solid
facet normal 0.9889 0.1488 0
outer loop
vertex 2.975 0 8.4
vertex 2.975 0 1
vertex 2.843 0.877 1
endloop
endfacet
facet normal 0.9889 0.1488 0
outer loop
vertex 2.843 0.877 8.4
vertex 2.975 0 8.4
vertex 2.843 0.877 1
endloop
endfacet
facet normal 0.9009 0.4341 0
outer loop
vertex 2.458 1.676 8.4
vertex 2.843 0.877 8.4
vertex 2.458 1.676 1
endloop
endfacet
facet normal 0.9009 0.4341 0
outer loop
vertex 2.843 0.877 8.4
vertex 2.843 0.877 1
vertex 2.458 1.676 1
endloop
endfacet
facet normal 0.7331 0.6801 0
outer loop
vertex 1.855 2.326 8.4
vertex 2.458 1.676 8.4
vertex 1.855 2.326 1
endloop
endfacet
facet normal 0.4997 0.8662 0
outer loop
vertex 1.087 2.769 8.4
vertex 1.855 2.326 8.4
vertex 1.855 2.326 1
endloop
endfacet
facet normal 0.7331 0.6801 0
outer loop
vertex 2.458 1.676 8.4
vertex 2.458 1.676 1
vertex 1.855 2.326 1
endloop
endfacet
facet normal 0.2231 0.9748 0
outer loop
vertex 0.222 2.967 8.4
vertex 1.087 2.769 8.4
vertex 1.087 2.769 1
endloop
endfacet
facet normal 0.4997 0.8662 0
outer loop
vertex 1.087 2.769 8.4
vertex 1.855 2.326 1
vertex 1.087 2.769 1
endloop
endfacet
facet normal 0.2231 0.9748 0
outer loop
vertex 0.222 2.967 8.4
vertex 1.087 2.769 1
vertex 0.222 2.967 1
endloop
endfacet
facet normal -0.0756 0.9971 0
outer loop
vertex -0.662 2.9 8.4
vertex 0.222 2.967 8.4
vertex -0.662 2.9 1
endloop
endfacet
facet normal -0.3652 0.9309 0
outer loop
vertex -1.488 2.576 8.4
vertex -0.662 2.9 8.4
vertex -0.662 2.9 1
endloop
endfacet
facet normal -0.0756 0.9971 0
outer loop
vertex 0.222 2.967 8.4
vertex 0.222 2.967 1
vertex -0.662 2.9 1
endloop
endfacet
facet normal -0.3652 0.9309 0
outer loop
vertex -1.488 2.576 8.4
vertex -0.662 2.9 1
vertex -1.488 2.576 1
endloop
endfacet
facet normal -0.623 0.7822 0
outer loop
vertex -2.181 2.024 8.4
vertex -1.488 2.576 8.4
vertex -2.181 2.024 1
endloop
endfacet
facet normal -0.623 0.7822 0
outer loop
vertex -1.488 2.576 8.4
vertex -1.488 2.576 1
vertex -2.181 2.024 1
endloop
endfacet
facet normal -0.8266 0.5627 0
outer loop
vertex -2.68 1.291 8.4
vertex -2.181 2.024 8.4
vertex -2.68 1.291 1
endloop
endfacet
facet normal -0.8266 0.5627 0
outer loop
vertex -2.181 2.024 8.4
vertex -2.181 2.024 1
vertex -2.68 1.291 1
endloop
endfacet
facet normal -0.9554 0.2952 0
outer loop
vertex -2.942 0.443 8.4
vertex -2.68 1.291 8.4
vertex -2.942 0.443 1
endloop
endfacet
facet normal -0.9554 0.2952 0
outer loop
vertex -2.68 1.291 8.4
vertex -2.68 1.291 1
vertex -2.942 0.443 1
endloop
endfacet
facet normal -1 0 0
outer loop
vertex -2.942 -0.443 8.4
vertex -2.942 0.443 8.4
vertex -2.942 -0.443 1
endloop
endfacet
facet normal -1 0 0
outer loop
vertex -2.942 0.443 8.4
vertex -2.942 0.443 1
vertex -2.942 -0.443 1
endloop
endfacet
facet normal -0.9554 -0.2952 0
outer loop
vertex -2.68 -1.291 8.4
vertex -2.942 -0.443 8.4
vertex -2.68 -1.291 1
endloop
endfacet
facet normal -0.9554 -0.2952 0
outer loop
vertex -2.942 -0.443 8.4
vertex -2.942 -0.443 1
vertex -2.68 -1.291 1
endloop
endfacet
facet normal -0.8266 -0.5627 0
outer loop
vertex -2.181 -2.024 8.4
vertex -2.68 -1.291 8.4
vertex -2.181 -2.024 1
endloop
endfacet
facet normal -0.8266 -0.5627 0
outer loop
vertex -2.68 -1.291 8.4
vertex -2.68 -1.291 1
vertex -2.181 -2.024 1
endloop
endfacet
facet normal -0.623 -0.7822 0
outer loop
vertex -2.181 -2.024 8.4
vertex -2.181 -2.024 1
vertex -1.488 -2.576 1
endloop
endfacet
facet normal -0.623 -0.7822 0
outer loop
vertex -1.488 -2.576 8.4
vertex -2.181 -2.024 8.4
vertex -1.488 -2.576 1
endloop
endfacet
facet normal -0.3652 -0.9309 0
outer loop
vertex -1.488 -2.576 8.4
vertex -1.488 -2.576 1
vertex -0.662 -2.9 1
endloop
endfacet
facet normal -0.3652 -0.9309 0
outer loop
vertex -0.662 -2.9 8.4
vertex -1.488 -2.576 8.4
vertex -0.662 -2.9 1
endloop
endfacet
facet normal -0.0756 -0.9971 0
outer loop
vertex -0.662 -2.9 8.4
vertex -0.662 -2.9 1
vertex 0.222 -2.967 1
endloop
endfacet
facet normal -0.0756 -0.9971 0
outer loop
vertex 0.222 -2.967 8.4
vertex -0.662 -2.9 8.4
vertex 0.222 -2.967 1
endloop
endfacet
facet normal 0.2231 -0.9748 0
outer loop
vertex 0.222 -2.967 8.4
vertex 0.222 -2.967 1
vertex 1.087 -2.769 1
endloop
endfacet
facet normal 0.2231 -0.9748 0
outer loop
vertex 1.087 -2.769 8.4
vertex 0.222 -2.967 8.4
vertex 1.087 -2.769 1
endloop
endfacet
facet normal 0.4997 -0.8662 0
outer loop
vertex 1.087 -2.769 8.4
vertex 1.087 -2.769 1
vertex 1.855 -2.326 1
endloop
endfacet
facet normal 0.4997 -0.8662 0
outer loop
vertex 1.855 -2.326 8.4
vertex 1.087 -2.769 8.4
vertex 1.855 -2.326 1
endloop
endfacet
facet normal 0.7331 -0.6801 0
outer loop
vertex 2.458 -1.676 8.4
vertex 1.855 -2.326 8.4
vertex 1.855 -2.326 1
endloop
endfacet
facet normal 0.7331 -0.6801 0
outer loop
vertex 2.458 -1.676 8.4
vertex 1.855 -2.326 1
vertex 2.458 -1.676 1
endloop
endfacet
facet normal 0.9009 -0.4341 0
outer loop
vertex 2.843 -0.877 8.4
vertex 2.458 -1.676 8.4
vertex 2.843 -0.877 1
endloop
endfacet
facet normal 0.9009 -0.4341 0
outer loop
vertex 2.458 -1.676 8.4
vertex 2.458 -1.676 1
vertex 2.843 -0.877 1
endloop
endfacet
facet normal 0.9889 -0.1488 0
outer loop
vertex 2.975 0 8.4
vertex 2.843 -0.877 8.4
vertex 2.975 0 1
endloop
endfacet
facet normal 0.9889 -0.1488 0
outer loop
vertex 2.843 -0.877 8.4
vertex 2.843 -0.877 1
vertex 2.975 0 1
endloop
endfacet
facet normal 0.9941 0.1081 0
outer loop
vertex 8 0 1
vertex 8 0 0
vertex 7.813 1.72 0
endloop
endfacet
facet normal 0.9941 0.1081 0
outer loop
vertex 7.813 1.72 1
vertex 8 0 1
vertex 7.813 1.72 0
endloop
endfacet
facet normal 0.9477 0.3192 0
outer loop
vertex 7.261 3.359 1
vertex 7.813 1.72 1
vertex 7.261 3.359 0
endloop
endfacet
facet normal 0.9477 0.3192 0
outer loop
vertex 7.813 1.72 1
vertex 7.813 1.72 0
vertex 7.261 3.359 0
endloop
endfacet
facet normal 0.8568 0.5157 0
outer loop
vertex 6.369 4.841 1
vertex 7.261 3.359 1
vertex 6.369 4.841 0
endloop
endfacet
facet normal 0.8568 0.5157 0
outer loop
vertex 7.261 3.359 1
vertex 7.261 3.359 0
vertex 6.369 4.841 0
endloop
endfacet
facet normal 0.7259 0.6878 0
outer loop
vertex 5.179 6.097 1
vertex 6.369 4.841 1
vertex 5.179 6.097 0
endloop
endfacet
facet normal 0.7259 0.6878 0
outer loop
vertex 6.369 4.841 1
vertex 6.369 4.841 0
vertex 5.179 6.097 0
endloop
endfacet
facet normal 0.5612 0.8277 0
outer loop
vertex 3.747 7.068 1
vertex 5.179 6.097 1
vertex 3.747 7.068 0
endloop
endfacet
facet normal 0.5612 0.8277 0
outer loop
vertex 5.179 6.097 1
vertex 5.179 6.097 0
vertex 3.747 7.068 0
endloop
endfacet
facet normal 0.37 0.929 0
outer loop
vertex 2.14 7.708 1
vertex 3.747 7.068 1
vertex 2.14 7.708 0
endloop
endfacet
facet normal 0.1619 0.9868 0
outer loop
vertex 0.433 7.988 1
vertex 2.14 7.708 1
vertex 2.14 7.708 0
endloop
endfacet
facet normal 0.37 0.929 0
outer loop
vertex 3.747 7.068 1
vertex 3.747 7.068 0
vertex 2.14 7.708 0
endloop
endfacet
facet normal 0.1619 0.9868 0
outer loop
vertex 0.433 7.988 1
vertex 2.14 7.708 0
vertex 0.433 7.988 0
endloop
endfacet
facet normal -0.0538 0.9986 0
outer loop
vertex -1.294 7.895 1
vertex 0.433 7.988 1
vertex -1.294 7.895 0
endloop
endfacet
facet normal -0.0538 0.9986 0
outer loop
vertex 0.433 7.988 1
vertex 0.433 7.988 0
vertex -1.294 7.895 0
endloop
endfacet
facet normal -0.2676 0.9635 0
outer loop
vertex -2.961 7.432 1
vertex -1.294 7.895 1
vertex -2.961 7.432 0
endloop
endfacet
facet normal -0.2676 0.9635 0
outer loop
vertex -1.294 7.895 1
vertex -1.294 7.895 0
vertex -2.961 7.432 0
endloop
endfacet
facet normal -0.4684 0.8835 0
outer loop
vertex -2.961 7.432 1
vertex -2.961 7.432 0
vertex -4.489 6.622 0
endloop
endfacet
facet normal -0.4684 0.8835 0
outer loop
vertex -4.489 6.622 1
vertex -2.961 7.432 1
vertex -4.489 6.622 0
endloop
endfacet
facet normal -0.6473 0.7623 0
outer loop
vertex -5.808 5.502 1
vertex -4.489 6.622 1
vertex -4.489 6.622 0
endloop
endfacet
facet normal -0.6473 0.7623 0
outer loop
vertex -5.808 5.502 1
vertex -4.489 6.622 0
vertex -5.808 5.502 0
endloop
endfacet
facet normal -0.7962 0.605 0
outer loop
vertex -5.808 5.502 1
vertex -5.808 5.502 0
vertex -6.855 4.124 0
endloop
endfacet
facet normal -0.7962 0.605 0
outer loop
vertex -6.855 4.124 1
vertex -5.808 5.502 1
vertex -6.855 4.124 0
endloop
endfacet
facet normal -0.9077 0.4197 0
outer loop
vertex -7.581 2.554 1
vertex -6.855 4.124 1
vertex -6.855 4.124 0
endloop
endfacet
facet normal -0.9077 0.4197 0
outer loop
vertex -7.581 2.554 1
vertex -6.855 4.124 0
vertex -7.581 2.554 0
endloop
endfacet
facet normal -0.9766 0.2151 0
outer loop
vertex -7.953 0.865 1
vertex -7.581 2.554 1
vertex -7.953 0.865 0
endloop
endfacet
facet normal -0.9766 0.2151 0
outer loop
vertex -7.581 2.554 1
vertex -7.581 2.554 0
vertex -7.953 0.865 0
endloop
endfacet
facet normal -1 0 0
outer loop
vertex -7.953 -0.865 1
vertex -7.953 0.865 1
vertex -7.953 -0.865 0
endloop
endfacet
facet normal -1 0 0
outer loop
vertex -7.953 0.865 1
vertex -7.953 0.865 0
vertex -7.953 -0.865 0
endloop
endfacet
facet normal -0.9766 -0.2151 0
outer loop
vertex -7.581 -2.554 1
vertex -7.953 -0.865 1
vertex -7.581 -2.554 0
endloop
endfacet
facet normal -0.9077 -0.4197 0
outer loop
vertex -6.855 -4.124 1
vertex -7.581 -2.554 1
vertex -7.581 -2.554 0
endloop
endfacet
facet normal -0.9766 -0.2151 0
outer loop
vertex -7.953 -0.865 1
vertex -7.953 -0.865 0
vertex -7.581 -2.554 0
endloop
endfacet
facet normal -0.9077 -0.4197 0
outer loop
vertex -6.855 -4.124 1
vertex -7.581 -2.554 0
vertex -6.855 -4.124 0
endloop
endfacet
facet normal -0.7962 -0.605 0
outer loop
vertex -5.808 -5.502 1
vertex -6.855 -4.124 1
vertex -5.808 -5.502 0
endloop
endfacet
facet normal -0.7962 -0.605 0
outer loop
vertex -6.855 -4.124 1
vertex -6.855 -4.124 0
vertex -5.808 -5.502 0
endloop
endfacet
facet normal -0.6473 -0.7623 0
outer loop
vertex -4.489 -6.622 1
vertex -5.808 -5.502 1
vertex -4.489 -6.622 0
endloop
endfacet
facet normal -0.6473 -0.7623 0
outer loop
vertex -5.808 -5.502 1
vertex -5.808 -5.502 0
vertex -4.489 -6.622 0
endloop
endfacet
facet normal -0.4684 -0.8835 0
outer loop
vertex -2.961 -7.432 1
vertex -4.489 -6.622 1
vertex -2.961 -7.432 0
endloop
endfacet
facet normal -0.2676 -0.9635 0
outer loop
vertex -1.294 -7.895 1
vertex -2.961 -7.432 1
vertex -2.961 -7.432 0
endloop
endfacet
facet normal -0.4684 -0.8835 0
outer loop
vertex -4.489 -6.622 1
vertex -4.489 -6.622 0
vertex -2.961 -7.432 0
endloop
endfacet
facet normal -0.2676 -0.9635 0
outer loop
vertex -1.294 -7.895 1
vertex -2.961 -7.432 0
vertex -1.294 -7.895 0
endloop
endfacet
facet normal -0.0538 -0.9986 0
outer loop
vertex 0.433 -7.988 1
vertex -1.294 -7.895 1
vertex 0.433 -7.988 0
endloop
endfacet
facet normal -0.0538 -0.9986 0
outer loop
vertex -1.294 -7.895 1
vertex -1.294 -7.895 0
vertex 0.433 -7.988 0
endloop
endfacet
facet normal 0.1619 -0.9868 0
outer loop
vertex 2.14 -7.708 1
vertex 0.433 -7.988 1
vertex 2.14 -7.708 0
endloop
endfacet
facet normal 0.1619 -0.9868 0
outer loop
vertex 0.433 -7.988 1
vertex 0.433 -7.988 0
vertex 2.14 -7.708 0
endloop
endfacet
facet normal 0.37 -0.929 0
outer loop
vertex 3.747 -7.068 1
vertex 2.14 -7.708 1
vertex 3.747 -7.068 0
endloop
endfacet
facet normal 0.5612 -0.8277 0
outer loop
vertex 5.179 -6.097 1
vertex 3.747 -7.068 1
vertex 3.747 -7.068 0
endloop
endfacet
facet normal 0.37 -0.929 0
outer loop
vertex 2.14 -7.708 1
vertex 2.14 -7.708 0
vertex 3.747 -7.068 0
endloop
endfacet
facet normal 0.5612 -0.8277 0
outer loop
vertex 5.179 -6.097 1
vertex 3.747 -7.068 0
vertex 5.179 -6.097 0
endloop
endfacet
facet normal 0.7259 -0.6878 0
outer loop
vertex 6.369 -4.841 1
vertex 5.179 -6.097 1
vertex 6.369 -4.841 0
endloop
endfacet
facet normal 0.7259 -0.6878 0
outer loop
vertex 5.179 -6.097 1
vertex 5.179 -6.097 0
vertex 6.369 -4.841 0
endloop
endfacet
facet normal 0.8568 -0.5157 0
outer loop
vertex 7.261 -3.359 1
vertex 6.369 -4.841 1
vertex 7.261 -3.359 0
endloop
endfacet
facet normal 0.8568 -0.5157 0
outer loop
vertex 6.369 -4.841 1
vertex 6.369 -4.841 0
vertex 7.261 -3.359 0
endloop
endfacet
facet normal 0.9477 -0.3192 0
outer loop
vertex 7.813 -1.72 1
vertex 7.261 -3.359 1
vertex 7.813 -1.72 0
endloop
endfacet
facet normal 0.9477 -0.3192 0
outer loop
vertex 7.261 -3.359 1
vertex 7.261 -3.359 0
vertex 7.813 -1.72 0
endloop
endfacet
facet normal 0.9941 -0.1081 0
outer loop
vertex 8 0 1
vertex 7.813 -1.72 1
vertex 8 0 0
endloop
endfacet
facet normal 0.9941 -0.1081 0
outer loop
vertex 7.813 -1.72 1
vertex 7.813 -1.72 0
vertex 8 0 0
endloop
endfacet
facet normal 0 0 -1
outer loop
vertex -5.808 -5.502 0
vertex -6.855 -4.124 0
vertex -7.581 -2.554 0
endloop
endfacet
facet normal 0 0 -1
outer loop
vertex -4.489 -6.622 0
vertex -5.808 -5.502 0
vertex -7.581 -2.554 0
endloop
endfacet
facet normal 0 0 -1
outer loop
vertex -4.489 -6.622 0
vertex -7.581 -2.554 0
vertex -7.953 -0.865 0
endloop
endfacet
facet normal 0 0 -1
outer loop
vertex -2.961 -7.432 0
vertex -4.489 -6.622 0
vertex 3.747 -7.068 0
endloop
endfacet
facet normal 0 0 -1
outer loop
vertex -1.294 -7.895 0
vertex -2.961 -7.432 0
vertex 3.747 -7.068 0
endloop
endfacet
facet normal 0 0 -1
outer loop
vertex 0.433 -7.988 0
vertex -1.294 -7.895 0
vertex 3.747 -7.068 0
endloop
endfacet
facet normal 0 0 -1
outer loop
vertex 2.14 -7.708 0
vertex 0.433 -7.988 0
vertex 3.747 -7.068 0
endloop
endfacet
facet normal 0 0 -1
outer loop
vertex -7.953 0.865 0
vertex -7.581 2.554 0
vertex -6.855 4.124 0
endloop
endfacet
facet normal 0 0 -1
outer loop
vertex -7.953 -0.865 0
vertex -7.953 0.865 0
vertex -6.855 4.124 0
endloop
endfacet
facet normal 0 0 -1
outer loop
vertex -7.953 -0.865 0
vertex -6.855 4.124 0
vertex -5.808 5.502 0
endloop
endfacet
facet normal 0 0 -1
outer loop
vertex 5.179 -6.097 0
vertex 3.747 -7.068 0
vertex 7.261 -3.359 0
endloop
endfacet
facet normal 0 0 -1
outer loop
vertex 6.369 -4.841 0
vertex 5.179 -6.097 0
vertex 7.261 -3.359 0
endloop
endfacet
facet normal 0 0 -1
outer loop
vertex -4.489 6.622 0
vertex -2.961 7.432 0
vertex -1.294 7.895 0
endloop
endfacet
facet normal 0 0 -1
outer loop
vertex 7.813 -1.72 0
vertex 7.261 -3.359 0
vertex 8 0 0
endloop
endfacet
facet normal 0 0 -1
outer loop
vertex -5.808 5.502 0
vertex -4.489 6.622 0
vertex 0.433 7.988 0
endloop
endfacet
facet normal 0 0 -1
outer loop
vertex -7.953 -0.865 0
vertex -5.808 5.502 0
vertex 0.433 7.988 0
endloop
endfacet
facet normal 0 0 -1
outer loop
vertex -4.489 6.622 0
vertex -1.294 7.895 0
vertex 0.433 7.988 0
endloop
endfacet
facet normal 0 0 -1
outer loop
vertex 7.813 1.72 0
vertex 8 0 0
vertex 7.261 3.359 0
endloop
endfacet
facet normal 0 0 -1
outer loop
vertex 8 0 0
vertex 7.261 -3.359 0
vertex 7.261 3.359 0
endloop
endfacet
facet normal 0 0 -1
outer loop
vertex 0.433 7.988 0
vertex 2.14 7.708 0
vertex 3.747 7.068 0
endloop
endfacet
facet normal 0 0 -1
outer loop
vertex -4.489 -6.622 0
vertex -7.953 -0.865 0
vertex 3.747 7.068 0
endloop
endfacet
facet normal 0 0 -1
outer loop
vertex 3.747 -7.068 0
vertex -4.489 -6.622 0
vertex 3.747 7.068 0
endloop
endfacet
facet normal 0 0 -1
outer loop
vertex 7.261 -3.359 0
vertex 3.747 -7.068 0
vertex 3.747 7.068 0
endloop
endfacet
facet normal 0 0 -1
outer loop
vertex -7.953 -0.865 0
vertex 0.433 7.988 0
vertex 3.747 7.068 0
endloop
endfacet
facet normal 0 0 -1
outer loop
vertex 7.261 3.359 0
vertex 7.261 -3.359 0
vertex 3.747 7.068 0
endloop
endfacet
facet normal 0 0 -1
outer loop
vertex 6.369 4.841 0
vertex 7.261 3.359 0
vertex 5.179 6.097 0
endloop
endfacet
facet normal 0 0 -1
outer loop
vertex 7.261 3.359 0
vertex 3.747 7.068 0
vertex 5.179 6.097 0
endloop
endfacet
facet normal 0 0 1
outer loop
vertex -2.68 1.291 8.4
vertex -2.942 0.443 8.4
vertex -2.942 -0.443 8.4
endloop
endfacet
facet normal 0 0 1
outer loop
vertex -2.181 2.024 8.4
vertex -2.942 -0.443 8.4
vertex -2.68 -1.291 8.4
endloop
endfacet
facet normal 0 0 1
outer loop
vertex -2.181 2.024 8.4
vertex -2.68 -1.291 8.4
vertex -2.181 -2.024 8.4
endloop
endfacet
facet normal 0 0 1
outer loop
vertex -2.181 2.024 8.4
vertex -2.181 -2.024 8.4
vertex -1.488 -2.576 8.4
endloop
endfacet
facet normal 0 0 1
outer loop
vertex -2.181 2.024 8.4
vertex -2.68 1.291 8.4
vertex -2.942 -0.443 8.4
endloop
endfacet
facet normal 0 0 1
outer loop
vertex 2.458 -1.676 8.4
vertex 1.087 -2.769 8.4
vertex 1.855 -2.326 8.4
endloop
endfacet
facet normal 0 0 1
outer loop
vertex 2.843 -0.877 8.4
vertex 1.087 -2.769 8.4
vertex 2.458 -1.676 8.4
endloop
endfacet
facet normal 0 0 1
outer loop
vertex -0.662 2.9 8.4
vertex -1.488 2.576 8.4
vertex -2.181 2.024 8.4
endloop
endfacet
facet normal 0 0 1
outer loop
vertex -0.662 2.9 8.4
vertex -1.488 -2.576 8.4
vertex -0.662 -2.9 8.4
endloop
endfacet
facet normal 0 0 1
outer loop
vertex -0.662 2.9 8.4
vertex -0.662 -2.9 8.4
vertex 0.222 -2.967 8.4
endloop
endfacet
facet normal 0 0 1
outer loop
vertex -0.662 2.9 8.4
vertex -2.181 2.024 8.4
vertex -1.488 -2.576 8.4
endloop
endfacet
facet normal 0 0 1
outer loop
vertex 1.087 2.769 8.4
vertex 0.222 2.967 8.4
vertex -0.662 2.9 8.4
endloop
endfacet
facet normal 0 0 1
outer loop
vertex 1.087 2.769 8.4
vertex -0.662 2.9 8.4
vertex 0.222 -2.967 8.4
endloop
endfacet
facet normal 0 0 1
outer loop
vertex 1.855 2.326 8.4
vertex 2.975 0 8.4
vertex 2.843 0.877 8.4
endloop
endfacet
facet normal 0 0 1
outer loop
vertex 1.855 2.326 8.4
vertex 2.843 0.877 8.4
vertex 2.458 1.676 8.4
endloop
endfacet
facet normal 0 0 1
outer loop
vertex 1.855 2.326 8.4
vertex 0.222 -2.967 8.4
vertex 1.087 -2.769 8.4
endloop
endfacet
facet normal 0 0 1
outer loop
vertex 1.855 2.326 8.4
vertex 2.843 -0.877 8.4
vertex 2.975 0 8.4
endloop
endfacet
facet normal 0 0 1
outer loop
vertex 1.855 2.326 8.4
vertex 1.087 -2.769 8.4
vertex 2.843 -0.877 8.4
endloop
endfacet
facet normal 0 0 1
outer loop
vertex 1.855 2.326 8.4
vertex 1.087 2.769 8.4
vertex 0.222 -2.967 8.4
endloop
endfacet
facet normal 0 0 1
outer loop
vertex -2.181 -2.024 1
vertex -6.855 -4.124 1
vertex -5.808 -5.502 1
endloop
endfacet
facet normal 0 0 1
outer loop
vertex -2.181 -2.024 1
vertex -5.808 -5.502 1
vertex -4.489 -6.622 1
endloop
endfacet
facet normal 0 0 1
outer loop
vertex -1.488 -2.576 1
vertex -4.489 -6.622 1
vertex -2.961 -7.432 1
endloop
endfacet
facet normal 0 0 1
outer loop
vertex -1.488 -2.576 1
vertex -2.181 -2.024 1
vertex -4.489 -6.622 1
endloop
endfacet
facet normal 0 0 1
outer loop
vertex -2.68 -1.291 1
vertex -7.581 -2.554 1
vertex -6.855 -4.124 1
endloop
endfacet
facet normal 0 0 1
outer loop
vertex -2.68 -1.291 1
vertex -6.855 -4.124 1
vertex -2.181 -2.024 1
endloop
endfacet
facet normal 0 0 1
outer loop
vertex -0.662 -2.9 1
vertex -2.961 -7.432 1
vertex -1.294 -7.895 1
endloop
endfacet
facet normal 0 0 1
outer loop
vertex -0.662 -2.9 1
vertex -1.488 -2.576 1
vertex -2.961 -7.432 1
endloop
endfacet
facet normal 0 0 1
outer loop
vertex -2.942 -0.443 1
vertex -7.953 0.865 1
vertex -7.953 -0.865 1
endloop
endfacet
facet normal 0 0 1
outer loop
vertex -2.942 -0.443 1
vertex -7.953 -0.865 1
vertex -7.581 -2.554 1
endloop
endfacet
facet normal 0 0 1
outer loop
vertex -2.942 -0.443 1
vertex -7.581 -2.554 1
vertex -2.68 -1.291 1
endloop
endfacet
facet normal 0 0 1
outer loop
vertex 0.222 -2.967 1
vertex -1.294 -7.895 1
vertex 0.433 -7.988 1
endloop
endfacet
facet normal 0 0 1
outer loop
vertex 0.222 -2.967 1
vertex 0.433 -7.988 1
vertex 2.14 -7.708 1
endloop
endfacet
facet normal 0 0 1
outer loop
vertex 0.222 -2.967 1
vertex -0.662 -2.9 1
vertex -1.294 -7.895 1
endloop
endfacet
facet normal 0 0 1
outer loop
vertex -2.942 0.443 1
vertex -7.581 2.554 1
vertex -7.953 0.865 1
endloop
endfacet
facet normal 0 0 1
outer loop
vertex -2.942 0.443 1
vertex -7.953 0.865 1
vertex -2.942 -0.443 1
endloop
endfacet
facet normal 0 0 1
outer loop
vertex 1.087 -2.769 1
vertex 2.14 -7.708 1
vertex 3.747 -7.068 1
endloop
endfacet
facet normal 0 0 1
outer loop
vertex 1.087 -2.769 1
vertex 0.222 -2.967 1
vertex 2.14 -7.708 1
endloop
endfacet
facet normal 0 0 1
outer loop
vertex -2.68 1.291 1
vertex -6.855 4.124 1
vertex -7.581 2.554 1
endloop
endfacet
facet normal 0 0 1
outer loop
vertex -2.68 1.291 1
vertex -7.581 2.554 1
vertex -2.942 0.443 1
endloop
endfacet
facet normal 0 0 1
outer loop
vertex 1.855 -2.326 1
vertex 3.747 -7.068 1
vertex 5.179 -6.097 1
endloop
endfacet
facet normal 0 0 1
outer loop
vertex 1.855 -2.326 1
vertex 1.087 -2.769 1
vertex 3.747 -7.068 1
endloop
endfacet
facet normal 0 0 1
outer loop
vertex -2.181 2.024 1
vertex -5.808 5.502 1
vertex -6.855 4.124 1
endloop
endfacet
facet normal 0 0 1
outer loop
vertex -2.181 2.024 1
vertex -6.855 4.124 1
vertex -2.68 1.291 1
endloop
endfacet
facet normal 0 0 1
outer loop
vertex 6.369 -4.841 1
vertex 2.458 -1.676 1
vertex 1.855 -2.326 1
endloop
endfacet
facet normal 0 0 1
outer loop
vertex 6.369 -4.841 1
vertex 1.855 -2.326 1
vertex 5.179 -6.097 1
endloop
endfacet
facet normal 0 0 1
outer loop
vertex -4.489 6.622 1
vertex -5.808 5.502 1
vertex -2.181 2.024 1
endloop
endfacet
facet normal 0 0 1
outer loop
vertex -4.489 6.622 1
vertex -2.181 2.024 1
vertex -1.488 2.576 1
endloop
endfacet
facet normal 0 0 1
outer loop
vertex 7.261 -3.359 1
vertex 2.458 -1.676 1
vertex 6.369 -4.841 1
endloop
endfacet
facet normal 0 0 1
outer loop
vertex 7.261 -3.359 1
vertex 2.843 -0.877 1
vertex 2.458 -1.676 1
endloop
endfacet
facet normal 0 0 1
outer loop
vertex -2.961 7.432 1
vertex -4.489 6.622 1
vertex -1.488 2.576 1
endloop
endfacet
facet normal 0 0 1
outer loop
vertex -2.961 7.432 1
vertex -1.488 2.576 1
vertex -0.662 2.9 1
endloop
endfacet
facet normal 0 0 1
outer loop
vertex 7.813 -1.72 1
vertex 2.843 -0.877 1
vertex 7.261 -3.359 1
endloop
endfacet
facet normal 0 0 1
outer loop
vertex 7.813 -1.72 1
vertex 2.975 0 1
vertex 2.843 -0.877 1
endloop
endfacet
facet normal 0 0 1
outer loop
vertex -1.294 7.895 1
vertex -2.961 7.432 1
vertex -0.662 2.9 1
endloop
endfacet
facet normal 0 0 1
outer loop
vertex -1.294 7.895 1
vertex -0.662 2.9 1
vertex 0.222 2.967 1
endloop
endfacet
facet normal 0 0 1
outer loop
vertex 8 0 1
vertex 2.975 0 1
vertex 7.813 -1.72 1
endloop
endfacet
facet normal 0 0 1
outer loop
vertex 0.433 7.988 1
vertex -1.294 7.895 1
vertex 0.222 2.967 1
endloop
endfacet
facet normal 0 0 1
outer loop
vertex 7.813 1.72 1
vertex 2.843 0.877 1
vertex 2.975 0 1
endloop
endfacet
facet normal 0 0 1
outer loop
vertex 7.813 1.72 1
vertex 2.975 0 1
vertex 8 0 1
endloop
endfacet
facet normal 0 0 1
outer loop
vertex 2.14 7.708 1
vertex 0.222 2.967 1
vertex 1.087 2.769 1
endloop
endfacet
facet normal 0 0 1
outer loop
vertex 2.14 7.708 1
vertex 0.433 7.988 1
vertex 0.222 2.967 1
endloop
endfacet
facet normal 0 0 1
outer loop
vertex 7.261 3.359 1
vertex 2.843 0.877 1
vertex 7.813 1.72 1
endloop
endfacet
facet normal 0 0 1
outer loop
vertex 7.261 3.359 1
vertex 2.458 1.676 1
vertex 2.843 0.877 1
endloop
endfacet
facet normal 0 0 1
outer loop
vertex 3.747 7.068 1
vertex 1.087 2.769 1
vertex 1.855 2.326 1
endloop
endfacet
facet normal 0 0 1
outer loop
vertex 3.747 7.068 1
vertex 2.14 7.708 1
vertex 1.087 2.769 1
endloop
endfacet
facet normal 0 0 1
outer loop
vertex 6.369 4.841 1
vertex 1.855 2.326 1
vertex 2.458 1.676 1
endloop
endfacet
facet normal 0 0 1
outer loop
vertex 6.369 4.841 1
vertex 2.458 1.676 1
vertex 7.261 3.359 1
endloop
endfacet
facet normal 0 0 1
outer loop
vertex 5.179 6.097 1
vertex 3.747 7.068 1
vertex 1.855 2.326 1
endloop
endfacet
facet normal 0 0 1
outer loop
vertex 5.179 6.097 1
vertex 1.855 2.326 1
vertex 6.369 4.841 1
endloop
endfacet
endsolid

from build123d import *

# Parameters (mm, degrees)
F0_R     = 8
F1_DEPTH = 1
F3_R     = 8
F4_DEPTH = 1
F5_R     = 2.975
F6_DEPTH = 7.4


with BuildPart() as f1:
    # F0 (on Top) → F1 (new body)
    with BuildSketch(Plane.XY):
        with Locations((-0.1634992032, 0.8891506742)):
            Circle(F0_R)
    extrude(amount=F1_DEPTH)


with BuildPart() as f4:
    # F3 (on Top) → F4 (new body)
    with BuildSketch(Plane.XY):
        Circle(F3_R)
    extrude(amount=F4_DEPTH)

    # F5 (on face) → F6 (join)
    with BuildSketch(Plane.XY.offset(1)):
        Circle(F5_R)
    extrude(amount=F6_DEPTH)


solid = f4.part
